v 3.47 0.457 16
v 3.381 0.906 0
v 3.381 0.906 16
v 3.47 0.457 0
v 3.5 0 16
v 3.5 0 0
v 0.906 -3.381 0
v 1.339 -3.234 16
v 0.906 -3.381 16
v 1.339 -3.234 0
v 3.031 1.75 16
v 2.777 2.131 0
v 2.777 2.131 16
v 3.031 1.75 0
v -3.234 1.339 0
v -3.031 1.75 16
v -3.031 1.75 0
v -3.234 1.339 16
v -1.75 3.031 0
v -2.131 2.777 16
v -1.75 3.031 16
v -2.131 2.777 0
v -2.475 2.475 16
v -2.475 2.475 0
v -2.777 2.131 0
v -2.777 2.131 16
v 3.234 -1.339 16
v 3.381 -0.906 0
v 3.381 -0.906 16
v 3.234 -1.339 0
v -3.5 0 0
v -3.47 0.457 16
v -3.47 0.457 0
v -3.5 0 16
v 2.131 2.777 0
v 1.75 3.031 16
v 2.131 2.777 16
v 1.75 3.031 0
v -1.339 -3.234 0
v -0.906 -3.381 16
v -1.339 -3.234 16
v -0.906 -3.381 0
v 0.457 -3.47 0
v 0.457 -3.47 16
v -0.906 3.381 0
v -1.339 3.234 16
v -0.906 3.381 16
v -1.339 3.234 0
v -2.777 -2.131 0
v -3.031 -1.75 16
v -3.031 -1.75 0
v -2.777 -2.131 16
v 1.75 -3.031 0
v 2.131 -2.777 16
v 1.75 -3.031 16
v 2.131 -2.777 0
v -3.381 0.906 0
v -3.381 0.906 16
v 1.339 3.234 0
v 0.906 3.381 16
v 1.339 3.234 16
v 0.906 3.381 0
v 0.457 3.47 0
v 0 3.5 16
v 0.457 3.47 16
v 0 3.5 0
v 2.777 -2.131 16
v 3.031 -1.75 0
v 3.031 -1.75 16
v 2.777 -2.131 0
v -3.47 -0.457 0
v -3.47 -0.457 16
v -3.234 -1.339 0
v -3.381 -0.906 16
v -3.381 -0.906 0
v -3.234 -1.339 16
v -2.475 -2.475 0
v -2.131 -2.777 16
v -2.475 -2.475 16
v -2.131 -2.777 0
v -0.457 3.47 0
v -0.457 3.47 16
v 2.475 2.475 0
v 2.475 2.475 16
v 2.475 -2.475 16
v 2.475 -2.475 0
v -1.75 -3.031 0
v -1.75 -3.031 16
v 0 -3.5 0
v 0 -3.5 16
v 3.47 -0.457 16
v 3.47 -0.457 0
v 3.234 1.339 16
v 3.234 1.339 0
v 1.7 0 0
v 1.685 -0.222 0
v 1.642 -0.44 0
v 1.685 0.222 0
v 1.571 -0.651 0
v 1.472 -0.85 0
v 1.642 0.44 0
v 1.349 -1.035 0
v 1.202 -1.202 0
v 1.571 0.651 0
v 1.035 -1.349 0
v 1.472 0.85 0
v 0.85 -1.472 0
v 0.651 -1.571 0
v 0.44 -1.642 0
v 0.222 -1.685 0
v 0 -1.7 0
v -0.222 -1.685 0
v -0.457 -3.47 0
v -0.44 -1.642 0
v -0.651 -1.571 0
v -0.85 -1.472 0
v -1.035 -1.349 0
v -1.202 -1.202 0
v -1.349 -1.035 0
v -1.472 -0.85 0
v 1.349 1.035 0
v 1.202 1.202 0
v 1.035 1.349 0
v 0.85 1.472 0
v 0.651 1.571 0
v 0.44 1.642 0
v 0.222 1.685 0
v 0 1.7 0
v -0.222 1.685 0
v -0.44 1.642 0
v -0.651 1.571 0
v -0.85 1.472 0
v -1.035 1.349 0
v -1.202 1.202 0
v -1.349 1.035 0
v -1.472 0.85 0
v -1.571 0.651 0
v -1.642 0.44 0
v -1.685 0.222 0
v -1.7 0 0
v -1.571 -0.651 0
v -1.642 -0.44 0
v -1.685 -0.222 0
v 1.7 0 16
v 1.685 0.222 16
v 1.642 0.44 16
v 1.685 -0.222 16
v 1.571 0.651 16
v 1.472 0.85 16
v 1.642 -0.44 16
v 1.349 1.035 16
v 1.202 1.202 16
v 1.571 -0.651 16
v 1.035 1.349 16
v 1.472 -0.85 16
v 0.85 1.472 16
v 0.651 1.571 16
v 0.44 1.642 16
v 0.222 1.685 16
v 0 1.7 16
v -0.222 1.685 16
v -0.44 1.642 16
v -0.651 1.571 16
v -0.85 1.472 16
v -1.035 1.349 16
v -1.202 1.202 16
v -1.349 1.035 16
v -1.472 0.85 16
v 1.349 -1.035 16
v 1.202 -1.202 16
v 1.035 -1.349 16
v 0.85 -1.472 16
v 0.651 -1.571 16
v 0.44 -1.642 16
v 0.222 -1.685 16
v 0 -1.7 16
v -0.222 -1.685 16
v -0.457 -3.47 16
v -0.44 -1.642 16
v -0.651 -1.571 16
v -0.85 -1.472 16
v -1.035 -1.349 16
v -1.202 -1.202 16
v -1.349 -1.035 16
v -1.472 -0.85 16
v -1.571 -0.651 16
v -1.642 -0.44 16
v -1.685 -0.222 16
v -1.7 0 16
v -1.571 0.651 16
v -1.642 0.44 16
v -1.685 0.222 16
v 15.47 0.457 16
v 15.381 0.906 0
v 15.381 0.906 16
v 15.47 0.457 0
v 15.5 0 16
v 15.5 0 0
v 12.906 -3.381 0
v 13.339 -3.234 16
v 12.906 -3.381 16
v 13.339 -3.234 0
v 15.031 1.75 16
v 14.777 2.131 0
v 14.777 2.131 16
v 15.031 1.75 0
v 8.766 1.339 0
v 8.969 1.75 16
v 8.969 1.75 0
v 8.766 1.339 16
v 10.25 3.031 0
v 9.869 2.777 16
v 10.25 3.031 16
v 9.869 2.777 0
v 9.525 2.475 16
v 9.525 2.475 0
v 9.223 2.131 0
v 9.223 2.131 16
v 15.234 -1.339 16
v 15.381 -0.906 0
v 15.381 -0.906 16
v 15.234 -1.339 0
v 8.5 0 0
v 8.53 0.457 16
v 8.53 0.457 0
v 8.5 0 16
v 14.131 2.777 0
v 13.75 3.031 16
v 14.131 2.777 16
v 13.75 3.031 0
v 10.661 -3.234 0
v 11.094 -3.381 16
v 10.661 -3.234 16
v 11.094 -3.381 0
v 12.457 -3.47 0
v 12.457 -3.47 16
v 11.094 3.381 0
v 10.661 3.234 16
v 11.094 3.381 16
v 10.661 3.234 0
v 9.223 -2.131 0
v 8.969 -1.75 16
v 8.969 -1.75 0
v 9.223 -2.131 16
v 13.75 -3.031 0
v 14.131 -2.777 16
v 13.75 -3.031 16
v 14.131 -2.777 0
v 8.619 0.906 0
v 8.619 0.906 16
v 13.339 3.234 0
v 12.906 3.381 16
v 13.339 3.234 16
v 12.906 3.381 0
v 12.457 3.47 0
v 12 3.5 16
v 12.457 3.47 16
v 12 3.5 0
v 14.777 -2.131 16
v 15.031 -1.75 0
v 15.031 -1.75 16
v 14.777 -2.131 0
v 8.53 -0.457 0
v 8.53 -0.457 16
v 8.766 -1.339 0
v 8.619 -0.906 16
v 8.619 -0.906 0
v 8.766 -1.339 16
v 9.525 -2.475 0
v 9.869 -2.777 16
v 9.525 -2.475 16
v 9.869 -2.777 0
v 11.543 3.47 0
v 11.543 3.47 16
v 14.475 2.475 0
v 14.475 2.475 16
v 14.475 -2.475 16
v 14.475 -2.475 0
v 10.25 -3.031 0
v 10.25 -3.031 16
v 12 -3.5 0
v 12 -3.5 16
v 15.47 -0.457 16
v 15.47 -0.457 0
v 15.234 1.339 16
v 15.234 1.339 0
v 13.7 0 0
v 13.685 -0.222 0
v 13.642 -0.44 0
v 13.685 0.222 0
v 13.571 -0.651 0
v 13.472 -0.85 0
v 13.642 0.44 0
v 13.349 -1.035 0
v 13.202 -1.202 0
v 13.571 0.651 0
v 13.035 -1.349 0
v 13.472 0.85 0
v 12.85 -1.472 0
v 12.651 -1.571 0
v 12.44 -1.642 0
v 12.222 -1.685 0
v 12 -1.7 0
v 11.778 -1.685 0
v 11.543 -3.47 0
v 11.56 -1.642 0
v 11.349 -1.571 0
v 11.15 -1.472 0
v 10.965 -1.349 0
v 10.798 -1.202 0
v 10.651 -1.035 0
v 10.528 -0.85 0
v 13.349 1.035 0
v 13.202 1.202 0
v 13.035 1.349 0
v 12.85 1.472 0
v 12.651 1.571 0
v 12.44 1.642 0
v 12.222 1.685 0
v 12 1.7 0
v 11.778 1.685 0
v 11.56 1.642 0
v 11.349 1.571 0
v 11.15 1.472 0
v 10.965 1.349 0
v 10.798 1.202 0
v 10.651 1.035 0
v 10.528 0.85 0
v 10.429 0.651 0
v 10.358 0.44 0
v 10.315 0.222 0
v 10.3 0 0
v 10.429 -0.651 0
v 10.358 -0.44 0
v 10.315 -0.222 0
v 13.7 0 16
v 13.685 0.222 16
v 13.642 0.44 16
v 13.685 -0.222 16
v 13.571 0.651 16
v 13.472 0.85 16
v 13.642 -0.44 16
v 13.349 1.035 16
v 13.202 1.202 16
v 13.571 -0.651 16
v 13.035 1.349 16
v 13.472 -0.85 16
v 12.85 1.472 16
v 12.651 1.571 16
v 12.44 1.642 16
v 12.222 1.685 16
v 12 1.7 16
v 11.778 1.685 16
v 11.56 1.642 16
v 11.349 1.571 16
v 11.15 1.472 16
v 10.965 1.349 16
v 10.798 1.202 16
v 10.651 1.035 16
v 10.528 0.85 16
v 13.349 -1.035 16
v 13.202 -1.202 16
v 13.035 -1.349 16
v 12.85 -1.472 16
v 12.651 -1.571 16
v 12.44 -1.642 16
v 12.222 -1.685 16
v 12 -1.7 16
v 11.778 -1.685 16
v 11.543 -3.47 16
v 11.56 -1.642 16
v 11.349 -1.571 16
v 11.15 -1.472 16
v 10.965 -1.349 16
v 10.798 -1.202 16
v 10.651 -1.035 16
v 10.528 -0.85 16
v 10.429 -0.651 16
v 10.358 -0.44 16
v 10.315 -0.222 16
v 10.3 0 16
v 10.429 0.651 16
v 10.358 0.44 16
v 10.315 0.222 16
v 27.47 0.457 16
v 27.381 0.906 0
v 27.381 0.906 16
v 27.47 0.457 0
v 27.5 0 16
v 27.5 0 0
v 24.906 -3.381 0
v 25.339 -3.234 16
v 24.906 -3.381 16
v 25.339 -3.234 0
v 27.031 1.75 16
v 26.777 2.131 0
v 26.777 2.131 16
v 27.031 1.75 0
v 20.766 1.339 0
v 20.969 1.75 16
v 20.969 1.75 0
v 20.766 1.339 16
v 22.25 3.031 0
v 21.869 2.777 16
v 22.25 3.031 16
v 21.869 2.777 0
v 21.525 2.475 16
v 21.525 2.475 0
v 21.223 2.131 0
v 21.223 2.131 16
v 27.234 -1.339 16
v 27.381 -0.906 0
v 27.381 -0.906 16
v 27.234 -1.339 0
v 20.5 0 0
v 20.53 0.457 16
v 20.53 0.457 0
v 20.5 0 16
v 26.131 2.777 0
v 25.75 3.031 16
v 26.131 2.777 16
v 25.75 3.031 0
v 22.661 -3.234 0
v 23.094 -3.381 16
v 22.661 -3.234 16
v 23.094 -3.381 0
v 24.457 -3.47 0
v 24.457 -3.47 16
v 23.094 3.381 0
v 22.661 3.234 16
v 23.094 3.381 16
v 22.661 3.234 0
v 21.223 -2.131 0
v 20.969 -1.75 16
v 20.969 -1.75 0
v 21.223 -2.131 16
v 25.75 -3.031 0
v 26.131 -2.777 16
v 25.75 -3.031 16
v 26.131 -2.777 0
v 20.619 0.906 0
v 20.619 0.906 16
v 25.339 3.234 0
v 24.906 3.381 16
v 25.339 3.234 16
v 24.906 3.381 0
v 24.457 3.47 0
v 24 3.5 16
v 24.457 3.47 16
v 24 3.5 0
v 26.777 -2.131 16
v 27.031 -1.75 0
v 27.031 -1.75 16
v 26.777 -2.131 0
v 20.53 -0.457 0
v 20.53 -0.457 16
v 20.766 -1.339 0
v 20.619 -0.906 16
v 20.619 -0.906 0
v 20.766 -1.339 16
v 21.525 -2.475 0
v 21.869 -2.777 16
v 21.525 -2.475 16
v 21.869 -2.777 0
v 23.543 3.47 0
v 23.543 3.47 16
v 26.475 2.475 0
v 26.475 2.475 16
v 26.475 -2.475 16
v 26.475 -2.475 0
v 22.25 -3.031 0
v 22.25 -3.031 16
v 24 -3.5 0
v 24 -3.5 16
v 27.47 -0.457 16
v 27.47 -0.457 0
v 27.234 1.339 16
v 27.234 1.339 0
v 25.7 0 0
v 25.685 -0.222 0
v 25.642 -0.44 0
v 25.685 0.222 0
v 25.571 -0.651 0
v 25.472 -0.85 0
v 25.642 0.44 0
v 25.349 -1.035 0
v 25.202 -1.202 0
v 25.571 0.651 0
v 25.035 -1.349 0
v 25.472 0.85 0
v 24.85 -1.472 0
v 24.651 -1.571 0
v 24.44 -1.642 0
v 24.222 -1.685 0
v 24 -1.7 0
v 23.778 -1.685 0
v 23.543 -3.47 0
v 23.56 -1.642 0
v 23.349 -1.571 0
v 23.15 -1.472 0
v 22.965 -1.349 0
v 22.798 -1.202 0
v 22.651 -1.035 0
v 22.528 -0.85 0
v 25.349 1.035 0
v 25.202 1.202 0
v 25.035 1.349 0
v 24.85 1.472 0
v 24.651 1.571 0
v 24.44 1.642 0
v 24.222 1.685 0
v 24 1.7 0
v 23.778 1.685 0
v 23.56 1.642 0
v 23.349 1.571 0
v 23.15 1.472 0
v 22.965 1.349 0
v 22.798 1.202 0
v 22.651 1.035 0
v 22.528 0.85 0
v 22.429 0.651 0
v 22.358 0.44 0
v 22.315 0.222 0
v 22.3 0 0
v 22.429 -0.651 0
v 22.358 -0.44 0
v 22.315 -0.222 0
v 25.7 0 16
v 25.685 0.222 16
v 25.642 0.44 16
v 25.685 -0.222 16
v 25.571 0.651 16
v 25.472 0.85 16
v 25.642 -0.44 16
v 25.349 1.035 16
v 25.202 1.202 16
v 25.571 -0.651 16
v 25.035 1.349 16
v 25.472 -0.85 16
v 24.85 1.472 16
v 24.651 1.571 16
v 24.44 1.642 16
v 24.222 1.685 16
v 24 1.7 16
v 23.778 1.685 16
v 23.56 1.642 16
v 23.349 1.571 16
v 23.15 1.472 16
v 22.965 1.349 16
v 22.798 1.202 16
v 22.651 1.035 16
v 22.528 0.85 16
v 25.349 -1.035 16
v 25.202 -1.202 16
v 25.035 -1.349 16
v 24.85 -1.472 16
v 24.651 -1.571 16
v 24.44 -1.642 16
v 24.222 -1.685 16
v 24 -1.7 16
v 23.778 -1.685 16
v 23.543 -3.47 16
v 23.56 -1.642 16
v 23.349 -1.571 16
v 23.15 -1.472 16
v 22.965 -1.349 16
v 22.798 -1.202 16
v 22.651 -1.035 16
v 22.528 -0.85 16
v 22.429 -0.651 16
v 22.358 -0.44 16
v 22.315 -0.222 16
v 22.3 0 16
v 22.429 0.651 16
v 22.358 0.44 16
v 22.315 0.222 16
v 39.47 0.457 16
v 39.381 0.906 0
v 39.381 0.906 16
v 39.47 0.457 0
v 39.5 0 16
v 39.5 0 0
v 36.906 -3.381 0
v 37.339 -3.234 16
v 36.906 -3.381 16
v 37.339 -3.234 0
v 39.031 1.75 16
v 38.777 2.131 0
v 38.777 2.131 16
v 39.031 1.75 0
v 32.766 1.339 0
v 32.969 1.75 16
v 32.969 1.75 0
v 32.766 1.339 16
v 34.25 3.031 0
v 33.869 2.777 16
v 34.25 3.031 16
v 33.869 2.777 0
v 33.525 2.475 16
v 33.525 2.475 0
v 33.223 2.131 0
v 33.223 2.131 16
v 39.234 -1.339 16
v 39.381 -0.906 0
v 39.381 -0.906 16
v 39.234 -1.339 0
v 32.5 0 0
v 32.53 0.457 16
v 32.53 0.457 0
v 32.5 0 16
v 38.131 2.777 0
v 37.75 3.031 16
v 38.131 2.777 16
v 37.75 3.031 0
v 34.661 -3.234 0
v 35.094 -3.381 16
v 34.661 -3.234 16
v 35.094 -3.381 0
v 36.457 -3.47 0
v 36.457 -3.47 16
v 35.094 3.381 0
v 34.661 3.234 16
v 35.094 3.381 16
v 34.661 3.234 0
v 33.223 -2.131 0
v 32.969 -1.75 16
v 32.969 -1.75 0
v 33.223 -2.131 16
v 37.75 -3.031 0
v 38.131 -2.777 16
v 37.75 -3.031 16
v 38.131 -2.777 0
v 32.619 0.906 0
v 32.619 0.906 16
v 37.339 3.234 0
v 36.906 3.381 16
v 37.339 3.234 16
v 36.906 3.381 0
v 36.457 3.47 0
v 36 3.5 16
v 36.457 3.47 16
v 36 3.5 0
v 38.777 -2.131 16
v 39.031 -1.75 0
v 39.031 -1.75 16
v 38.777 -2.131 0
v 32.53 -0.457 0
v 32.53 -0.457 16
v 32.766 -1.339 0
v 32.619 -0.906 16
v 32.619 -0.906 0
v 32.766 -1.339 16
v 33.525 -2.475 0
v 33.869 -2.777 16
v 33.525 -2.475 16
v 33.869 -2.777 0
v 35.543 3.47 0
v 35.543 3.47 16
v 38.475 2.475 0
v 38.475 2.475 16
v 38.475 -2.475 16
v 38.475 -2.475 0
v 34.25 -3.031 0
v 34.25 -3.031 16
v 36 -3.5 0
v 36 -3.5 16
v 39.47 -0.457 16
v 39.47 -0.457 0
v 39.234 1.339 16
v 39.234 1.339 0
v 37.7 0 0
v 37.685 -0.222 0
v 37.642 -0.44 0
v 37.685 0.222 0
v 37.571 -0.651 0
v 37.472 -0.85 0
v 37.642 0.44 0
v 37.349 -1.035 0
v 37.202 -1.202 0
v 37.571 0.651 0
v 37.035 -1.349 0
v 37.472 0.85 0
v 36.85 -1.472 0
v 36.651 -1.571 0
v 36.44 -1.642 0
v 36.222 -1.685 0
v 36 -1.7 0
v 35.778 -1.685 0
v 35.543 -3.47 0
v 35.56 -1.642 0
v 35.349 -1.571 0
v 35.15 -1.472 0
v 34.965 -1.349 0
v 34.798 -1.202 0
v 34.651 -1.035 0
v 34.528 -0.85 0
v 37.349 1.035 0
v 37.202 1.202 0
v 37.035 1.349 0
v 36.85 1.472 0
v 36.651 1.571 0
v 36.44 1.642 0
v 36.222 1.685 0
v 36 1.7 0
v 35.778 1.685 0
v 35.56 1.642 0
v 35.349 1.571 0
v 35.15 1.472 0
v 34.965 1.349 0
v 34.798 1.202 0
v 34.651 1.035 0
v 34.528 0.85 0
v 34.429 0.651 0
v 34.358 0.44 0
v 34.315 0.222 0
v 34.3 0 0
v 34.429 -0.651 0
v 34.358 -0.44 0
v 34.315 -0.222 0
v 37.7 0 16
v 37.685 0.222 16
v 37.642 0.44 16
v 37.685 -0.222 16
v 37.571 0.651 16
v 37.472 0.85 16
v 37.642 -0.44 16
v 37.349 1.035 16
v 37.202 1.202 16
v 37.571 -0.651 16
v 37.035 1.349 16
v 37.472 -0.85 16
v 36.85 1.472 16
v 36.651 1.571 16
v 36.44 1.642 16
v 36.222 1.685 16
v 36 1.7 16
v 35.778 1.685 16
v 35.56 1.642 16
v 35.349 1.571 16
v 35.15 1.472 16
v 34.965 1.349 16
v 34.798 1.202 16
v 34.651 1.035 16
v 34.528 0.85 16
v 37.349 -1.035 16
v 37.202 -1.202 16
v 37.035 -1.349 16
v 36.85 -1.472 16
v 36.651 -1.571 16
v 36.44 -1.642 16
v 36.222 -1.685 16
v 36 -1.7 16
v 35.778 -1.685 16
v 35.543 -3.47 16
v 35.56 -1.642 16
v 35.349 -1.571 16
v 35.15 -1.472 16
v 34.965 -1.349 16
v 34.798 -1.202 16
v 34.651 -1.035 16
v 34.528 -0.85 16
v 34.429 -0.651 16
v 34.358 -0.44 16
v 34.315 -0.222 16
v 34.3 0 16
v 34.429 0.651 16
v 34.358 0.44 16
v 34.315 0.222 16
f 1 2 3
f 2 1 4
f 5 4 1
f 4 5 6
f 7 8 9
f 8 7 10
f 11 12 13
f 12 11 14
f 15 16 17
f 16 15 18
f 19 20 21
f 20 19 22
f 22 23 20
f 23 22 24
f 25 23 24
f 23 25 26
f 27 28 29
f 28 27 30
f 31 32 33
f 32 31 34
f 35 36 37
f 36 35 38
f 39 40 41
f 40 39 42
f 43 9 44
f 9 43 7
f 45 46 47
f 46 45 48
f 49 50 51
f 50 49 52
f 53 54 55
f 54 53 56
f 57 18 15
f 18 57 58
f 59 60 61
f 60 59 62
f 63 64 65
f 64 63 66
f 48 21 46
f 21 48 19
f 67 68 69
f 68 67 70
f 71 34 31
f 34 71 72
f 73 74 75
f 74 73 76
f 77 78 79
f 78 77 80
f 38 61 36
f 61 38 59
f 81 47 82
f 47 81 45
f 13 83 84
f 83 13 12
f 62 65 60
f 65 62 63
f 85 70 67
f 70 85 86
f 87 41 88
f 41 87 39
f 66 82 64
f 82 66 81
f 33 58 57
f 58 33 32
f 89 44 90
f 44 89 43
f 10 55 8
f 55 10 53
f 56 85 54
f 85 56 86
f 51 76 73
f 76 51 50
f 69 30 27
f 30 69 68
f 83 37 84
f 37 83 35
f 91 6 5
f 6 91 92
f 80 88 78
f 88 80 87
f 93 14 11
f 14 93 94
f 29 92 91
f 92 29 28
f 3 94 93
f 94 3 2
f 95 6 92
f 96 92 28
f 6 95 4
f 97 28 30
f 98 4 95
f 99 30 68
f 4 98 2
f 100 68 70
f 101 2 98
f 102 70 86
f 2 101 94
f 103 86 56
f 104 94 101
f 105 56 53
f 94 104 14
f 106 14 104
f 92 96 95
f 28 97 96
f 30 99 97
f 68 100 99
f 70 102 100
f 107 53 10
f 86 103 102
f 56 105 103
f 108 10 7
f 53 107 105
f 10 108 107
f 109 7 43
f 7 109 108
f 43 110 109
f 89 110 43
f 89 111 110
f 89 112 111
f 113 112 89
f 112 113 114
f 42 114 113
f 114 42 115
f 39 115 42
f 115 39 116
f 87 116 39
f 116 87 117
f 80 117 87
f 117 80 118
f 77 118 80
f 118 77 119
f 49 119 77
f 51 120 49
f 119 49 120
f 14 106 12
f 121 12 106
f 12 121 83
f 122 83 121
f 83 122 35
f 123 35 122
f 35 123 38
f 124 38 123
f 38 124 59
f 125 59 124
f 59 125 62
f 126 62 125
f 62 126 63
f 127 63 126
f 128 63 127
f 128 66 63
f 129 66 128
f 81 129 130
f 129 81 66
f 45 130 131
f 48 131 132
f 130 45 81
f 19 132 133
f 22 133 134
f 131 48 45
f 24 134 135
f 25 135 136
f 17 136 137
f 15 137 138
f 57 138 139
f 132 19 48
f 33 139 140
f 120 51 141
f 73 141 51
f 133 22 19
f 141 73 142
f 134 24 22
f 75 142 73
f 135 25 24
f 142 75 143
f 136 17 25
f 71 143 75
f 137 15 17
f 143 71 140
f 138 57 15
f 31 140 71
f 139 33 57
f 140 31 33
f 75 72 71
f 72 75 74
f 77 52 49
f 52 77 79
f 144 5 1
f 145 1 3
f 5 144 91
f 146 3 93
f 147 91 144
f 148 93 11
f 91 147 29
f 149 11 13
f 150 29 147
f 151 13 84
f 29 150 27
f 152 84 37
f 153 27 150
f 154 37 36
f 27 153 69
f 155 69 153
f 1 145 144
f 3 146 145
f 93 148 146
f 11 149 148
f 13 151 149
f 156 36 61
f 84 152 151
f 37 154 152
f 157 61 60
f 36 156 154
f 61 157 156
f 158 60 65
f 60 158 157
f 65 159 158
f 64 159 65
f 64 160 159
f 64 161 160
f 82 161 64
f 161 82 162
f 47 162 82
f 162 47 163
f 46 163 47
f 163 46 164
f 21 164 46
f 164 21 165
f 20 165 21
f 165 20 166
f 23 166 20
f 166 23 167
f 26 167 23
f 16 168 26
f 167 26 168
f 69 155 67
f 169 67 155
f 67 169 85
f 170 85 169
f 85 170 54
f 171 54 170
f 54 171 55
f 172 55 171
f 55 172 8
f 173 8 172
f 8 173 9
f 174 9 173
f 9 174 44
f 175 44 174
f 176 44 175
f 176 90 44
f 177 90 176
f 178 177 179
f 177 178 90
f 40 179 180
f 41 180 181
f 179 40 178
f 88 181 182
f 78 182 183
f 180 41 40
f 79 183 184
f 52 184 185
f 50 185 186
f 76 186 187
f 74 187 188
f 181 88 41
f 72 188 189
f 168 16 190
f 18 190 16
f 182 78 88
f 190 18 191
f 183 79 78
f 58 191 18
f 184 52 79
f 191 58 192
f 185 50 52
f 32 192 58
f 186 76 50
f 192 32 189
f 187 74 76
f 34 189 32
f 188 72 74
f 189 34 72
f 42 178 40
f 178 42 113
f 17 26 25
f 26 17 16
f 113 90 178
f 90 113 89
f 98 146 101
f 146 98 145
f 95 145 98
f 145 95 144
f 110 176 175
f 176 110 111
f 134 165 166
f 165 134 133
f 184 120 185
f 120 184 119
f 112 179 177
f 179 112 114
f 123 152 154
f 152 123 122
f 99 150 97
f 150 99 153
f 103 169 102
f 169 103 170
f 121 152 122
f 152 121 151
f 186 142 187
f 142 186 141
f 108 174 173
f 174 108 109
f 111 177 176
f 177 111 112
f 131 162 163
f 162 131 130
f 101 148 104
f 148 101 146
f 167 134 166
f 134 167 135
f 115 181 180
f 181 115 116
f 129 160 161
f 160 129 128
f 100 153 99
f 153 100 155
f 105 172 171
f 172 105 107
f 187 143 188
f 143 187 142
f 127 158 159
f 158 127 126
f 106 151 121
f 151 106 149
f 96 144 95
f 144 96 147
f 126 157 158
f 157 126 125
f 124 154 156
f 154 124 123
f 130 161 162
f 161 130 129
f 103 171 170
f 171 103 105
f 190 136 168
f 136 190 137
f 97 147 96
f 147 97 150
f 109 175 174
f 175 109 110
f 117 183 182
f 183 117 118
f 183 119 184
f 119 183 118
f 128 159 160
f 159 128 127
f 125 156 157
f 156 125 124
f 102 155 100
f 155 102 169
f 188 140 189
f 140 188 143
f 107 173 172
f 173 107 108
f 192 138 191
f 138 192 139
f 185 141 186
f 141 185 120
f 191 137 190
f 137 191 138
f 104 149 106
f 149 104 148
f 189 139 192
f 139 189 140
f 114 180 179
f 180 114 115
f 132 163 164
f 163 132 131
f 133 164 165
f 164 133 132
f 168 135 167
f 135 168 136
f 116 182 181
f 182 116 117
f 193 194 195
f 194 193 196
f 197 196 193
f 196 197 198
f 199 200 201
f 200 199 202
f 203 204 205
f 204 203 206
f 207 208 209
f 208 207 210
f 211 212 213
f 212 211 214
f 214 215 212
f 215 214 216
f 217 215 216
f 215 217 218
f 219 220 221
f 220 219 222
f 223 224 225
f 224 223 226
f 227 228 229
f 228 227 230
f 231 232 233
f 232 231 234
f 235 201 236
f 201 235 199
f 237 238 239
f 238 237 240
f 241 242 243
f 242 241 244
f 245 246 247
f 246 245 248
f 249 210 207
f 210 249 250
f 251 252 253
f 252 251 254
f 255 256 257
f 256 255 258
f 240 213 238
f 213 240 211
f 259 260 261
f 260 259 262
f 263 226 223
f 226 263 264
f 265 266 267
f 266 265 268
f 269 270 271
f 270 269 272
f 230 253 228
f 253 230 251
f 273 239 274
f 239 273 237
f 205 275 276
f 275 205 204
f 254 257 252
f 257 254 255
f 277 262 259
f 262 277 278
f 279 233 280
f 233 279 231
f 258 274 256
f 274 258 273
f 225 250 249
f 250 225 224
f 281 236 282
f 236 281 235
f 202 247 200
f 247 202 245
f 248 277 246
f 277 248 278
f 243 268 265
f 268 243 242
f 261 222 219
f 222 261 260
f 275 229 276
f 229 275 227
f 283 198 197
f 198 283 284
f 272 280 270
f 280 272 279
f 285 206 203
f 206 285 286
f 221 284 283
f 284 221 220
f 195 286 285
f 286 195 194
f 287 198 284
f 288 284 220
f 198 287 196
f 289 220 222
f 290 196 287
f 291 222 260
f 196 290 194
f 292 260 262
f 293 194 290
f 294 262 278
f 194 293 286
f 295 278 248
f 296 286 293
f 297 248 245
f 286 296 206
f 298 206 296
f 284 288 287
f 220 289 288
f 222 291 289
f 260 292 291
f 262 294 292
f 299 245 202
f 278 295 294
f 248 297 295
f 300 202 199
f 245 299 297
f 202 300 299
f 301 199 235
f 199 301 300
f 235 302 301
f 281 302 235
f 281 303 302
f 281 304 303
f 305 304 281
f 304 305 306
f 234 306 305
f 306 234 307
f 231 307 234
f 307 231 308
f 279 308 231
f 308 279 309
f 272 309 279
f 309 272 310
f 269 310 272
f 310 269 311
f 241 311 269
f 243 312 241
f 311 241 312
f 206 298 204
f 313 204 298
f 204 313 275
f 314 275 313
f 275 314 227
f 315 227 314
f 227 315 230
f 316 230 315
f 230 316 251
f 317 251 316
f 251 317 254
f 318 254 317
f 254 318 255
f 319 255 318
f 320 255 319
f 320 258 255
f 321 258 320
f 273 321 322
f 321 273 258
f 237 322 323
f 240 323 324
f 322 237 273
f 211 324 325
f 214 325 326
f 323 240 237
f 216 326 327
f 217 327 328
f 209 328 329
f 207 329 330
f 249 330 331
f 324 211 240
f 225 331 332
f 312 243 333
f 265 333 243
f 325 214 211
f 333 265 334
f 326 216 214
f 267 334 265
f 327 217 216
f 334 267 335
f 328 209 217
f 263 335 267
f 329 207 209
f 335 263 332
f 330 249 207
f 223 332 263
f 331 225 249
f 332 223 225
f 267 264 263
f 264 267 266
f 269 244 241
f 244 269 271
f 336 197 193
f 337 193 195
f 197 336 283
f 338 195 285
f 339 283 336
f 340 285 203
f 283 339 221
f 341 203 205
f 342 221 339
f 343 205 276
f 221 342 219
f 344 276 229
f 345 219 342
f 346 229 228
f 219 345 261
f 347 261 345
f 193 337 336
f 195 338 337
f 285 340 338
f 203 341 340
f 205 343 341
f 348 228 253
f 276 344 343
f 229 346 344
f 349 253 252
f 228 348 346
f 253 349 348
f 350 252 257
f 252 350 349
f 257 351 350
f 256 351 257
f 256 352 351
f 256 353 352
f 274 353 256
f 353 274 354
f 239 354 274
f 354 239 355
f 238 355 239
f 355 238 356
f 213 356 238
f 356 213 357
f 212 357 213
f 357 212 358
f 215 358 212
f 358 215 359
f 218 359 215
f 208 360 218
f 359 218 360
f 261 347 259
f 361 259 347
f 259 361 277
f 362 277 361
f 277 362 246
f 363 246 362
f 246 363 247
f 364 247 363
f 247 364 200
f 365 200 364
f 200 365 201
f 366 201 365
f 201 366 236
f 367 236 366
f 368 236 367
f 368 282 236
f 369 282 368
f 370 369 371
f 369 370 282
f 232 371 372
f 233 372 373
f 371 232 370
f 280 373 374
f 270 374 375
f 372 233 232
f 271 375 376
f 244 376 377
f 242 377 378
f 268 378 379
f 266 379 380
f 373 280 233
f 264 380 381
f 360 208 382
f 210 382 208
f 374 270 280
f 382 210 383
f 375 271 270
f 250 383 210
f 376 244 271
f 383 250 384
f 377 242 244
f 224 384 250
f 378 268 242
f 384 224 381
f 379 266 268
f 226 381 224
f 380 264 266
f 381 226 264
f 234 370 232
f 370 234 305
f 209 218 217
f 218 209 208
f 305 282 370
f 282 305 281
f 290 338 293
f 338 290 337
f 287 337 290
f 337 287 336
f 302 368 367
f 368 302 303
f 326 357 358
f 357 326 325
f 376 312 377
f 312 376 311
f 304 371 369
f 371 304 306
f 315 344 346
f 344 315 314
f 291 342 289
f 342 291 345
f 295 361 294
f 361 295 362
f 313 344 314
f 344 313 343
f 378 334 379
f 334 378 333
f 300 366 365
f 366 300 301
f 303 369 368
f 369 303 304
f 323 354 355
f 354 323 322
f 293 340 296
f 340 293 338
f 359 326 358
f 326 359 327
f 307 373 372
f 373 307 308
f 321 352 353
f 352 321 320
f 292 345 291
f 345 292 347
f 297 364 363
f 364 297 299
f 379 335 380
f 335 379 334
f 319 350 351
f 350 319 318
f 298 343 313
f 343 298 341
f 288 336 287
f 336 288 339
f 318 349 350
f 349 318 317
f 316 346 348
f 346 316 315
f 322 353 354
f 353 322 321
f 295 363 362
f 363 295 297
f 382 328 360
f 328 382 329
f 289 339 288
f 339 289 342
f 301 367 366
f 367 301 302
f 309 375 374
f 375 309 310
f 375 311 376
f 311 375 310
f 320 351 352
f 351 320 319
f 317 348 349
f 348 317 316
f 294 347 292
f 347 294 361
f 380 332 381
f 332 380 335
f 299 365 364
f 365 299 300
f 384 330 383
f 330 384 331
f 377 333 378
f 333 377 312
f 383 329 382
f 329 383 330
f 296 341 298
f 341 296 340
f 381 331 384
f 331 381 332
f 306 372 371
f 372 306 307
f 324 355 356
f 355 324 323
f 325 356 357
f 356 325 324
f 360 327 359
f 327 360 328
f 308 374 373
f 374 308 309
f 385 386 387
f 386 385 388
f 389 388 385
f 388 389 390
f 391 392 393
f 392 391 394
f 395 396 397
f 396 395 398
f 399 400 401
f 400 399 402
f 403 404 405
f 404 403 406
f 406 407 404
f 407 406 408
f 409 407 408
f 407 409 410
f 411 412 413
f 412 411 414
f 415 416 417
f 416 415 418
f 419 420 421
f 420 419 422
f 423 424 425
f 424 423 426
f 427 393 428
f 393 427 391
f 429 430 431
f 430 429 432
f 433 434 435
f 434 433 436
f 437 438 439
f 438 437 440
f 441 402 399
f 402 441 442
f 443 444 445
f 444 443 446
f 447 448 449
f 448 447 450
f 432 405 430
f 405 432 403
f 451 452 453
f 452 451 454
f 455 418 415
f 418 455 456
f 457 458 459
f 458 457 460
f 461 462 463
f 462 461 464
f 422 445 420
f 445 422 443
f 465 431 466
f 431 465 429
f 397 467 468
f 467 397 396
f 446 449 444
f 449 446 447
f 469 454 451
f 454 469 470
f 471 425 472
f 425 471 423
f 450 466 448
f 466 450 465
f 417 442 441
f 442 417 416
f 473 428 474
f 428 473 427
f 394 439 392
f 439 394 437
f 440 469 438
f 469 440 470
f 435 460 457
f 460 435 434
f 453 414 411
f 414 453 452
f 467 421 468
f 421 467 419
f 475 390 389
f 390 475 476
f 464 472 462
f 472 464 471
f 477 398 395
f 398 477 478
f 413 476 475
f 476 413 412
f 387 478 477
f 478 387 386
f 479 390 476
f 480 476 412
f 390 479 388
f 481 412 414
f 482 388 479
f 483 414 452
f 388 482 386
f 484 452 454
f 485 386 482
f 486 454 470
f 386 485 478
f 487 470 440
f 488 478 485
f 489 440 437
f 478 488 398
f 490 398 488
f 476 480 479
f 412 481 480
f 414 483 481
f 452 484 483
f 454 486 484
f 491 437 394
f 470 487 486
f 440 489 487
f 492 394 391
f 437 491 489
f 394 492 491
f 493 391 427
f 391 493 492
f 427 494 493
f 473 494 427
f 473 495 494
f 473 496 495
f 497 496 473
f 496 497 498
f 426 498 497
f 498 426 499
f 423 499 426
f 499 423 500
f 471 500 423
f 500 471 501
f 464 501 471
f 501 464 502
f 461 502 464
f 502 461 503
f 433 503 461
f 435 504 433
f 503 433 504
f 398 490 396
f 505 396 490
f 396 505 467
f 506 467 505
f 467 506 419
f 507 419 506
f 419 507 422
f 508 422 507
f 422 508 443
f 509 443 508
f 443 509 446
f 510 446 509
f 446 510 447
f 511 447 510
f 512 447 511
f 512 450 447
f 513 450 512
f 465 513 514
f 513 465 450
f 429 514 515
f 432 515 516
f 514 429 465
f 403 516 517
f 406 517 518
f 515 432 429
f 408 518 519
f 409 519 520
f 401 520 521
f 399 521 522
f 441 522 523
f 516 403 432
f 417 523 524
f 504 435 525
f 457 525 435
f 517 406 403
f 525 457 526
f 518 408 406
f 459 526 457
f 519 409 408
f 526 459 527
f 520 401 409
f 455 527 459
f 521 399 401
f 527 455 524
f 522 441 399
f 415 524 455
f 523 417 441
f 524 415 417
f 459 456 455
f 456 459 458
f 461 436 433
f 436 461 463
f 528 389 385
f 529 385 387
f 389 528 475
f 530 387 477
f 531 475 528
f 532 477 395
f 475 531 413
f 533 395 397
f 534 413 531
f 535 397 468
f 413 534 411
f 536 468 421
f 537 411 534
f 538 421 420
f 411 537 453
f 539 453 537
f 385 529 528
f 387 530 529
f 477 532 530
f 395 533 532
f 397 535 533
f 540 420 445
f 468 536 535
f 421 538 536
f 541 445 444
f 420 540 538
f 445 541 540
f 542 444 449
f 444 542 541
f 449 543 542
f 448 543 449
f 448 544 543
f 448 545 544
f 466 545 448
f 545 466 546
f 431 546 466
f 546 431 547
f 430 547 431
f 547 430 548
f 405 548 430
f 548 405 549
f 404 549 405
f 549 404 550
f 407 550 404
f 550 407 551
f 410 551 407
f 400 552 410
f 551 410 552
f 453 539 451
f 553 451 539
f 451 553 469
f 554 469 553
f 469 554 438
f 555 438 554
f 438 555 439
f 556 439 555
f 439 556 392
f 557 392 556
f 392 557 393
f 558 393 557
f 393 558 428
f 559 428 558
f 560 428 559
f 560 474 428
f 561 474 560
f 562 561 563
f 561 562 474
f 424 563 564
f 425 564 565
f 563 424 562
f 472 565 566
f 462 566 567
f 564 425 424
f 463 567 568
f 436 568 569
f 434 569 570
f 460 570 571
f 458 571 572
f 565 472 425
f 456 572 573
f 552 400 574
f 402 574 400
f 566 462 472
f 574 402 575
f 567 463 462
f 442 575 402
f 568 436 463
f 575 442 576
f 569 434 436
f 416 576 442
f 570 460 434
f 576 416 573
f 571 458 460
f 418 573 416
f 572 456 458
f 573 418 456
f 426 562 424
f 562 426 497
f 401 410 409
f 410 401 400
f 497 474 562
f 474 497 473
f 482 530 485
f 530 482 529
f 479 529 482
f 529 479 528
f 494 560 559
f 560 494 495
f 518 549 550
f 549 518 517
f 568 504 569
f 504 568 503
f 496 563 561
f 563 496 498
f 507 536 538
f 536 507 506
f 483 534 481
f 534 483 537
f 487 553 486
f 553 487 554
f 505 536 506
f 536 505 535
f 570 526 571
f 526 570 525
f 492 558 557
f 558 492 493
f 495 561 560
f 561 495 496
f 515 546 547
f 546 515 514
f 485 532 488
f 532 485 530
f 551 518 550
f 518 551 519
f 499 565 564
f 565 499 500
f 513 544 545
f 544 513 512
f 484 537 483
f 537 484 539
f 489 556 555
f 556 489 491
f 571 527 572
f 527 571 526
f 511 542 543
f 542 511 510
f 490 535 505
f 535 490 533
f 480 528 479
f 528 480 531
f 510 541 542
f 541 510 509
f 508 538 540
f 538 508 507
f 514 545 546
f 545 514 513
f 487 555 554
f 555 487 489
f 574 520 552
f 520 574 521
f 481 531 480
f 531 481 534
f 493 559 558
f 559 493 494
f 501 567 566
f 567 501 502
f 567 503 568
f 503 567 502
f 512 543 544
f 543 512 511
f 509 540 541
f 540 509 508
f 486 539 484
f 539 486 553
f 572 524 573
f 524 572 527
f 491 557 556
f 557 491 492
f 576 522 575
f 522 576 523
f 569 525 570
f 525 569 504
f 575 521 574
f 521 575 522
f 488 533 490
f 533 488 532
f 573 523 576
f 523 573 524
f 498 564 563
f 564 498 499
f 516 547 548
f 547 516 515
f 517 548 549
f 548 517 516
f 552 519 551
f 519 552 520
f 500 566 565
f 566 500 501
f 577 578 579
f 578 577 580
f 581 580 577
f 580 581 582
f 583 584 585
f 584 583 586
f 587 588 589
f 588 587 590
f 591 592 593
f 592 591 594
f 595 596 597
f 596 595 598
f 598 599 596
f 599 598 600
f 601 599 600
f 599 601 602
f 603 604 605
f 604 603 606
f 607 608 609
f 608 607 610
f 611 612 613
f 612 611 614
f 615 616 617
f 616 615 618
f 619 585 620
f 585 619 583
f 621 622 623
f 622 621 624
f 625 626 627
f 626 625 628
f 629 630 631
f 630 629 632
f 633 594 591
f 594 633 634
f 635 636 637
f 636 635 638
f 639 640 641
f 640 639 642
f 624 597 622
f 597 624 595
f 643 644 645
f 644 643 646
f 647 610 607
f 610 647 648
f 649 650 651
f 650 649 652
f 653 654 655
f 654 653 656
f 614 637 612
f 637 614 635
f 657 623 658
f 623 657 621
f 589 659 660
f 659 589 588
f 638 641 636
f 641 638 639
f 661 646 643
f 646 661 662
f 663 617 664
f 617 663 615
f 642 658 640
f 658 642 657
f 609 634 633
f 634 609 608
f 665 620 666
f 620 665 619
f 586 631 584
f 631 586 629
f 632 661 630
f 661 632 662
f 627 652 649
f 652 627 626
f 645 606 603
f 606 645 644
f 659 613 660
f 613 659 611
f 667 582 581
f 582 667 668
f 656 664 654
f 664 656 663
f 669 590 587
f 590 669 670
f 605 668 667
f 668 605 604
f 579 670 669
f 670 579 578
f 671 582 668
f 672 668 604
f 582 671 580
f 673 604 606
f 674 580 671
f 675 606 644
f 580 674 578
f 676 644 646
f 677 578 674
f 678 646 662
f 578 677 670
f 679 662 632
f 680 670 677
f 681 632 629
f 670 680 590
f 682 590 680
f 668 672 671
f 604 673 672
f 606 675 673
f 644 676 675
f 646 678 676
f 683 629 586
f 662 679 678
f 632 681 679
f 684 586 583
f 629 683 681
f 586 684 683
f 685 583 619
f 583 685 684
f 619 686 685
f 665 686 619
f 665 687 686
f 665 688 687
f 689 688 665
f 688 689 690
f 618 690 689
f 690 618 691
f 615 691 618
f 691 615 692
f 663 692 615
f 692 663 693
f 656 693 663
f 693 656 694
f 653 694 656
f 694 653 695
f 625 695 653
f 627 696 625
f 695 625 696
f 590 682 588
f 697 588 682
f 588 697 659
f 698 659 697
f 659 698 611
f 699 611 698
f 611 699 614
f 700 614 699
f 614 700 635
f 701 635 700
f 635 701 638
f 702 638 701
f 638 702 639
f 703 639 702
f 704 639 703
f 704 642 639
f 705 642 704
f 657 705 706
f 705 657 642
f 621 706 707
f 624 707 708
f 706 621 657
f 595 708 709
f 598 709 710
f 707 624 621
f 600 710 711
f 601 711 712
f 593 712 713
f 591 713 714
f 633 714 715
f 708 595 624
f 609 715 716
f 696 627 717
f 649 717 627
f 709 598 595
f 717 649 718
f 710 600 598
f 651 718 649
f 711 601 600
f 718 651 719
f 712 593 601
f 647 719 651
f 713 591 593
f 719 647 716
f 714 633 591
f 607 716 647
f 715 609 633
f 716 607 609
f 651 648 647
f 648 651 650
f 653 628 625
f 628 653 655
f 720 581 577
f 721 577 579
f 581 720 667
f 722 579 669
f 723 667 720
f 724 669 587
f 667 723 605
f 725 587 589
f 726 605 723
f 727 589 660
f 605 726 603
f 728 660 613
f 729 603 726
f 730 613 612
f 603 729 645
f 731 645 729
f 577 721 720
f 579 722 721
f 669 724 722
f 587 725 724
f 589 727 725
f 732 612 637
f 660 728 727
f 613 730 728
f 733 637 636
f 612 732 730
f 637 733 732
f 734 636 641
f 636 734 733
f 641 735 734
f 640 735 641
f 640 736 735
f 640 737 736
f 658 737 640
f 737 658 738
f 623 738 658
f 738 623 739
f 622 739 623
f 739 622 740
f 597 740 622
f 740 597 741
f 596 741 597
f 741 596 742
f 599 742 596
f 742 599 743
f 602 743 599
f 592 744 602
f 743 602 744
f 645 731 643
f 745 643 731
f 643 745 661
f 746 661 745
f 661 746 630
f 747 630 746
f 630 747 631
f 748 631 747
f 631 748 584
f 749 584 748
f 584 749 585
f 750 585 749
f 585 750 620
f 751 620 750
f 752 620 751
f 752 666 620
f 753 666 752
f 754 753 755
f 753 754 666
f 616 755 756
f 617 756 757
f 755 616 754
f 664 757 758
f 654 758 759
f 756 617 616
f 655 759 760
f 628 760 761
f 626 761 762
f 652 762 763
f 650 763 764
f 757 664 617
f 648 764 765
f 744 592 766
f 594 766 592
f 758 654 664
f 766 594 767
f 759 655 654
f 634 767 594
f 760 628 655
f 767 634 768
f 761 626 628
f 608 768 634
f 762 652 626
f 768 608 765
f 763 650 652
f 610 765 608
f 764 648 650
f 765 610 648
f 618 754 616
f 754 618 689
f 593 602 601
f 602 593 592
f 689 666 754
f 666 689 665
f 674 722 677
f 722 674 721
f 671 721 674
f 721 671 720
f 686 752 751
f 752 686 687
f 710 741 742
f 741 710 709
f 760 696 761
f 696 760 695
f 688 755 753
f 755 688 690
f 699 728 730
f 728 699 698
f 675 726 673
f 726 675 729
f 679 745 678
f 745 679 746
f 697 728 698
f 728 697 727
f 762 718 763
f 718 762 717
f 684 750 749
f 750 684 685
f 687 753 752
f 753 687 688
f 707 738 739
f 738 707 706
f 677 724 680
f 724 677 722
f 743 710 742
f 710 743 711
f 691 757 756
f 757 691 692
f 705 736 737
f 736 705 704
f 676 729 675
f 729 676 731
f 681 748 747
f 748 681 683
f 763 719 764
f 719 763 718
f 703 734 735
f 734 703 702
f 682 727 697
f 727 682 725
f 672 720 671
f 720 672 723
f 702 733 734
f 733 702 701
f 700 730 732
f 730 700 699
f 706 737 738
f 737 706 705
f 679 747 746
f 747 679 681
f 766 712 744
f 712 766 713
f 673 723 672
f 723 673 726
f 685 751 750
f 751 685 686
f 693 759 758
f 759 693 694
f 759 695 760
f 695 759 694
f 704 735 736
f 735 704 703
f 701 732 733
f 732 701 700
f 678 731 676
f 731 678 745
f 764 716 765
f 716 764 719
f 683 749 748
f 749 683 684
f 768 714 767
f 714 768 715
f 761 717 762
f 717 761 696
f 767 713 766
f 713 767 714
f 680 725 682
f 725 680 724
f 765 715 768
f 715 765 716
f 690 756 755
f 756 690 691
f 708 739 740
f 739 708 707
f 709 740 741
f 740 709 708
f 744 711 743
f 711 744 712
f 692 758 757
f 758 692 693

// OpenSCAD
// ============================================================================
// CyberWing — M3 standoff columns, 16 mm (×4)
// Spacers between the side frame's 4× M3 inserts (64×40 pattern) and the WAGO
// snap plate. M3 bolt passes clear through each column. Print upright.
// ============================================================================
$fn = 48;

SO_OD = 7;        // column outer diameter
SO_H  = 16;       // length
M3_CLR = 3.4;     // M3 clearance bore
N = 4;            // how many
PITCH = 12;       // spacing on the bed

for (i = [0:N-1])
  translate([i*PITCH, 0, 0])
    difference() {
      cylinder(d=SO_OD, h=SO_H);
      translate([0,0,-0.1]) cylinder(d=M3_CLR, h=SO_H+0.2);
    }
